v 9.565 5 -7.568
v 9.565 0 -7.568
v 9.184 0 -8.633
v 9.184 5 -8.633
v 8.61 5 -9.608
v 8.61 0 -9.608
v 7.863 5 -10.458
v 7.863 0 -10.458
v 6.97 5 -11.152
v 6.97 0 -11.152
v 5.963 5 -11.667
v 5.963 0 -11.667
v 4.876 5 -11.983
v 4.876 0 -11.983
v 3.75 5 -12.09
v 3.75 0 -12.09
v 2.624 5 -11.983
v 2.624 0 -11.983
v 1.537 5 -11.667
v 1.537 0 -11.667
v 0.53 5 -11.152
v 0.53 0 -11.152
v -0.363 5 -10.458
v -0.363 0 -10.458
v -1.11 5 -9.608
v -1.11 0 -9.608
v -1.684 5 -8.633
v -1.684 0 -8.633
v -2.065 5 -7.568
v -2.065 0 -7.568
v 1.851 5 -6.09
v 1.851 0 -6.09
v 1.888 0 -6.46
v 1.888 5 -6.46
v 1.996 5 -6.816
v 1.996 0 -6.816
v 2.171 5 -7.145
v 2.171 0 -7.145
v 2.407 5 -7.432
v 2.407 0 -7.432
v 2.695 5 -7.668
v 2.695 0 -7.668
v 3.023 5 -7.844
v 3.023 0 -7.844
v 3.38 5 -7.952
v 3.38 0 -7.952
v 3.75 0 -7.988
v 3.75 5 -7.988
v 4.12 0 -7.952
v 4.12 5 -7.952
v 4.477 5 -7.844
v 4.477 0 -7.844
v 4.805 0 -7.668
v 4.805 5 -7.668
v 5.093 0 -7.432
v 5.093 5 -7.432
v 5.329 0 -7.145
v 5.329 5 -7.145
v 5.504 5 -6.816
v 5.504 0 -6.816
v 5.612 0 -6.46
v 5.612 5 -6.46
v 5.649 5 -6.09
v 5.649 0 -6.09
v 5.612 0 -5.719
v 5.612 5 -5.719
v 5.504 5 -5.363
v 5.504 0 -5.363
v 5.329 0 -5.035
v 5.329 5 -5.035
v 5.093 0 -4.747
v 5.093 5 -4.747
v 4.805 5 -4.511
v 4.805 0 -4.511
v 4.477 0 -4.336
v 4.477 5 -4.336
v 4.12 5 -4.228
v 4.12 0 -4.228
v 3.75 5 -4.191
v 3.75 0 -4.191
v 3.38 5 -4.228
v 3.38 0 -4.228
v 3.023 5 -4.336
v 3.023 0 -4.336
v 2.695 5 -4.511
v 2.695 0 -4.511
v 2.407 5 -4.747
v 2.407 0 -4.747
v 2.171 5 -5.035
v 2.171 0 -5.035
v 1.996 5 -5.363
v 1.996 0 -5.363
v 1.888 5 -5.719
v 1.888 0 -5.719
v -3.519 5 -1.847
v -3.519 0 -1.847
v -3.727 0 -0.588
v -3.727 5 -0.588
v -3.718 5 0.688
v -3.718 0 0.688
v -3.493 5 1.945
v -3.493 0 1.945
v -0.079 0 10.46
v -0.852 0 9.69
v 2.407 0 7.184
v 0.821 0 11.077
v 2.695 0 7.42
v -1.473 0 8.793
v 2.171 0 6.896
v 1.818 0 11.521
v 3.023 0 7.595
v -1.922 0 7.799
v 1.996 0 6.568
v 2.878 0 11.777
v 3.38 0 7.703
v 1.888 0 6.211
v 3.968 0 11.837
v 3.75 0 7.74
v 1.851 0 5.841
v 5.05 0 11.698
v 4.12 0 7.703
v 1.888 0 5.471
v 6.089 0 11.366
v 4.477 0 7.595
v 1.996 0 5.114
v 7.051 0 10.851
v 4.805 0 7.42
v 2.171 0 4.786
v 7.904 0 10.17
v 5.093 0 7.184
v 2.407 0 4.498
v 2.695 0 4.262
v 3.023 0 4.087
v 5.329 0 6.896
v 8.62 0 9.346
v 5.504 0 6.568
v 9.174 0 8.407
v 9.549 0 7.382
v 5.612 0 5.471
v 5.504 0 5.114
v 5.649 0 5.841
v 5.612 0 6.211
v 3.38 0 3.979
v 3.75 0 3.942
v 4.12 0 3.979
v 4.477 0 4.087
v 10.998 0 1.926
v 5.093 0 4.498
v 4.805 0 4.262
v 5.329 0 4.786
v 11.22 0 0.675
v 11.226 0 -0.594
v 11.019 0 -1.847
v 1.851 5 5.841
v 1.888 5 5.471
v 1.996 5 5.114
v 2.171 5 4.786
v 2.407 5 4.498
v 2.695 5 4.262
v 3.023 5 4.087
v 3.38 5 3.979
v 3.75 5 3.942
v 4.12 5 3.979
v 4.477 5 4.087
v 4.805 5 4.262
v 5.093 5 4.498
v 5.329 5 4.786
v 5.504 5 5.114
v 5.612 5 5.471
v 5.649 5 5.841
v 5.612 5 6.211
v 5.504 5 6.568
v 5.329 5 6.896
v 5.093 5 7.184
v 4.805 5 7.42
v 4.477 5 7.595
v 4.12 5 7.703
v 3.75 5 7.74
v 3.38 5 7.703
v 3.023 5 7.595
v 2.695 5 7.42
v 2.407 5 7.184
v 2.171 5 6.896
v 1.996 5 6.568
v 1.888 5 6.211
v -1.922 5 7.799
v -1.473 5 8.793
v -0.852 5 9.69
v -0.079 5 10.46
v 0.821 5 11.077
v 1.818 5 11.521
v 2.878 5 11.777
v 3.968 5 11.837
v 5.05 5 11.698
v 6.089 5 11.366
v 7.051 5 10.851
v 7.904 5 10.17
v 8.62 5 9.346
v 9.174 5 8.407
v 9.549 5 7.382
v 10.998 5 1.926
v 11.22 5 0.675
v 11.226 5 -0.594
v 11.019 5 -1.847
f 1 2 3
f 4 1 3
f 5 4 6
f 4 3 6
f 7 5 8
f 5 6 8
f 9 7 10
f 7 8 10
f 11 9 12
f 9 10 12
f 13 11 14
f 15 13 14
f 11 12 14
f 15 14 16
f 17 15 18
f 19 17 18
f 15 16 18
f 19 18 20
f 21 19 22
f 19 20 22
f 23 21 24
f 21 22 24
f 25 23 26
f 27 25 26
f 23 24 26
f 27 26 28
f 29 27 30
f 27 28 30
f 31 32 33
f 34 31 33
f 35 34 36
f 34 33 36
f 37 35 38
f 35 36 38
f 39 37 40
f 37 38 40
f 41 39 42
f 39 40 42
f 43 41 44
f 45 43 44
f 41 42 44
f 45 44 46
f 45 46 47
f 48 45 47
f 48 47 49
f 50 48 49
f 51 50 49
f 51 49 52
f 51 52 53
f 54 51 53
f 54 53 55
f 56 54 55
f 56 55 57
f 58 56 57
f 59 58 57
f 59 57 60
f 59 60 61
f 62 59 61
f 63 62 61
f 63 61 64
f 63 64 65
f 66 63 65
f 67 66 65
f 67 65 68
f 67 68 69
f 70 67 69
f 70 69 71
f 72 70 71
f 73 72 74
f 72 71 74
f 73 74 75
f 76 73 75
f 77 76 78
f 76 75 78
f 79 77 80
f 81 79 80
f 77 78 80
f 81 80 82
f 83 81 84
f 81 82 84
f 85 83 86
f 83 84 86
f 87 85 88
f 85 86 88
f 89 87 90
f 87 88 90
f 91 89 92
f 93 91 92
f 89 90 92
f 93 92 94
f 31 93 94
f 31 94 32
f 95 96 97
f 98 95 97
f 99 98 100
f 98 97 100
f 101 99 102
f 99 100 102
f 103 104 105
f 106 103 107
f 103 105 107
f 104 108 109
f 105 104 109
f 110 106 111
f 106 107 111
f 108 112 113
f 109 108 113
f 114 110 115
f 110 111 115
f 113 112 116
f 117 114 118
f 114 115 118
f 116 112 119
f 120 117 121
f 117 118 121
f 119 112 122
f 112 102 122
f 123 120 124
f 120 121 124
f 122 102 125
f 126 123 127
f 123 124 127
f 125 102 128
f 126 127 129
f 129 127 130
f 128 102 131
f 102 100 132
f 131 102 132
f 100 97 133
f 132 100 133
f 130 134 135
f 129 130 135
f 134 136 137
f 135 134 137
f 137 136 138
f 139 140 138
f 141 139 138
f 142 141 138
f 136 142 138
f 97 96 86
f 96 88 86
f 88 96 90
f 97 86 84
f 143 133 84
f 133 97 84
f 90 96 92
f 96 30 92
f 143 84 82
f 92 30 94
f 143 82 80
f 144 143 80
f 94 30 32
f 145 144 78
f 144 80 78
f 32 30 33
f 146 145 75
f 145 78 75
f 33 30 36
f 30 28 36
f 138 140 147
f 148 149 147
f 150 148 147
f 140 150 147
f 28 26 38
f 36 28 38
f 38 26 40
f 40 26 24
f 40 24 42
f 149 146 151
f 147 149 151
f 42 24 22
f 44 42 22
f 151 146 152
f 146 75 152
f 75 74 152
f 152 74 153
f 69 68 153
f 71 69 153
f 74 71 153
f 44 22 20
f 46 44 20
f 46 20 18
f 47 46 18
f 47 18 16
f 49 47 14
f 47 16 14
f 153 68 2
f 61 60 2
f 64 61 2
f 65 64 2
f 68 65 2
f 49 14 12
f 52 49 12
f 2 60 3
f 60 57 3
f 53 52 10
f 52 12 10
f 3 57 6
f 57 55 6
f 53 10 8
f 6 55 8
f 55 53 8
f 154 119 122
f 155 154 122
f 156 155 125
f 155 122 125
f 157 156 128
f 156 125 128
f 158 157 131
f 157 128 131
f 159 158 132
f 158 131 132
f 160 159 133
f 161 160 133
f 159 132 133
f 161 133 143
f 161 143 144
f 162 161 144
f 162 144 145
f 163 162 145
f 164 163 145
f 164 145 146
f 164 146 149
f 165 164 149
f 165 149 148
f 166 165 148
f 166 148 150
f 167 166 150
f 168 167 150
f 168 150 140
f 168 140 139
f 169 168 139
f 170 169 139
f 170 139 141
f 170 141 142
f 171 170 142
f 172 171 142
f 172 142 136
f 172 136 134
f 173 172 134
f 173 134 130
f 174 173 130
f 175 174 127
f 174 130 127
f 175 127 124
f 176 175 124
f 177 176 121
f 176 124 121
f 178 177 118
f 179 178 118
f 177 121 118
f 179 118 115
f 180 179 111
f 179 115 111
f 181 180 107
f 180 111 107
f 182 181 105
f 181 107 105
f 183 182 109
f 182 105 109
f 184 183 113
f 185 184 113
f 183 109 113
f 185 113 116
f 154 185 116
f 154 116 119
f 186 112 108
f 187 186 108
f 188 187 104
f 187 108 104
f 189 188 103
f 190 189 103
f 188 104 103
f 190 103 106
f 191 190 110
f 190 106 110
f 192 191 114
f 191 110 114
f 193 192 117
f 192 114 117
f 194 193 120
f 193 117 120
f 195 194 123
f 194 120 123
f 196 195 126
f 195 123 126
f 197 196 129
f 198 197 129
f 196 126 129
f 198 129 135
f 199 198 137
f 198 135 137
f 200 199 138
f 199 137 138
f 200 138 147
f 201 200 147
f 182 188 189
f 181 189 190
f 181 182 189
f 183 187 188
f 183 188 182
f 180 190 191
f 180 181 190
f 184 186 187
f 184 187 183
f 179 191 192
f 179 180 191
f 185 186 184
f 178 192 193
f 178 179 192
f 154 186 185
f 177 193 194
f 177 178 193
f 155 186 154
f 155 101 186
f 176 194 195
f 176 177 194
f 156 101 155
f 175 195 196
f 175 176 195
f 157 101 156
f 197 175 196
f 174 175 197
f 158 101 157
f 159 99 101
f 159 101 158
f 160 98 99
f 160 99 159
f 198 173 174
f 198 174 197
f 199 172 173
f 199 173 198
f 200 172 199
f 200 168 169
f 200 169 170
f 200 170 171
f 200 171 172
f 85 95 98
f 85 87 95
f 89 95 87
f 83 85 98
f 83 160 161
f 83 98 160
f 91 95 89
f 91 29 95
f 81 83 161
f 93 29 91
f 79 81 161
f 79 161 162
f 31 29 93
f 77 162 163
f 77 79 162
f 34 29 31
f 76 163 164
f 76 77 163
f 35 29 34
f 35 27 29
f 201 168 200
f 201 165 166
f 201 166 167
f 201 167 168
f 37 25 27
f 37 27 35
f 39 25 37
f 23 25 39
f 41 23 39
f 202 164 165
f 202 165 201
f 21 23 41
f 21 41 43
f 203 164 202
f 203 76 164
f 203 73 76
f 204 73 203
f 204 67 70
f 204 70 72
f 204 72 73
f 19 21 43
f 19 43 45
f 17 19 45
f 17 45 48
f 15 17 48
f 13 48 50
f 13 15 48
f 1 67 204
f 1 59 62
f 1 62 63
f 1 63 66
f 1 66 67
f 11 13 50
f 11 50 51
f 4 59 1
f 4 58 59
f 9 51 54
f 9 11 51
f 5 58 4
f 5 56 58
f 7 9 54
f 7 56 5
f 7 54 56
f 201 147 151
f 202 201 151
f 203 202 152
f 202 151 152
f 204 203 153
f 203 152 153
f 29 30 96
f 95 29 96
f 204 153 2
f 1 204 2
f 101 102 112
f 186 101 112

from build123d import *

# Parameters (mm, degrees)
BOSS_EXTRUDE2_DEPTH   = 5
F_6_CLEARANCE_HOLE1_D = 3.7973


with BuildPart() as part:
    # Sketch2 → Boss-Extrude2 (new body)
    with BuildSketch(Plane(origin=(0, 0, 0), x_dir=(1, 0, 0), z_dir=(0, 1, 0))):
        with BuildLine():
            ThreePointArc((-1.921673483, -7.798539123), (3.967844549, -11.837003018), (9.548776015, -7.381801872))
            Line((9.548776015, -7.381801872), (10.998470019, -1.926053578))
            ThreePointArc((10.998470019, -1.926053578), (11.24988985, -0.04064778), (11.018921171, 1.84737246))
            Line((11.018921171, 1.84737246), (9.565136937, 7.567628243))
            ThreePointArc((9.565136937, 7.567628243), (3.75, 12.089730275), (-2.065136937, 7.567628243))
            Line((-2.065136937, 7.567628243), (-3.518921171, 1.84737246))
            ThreePointArc((-3.518921171, 1.84737246), (-3.749830525, -0.050419155), (-3.493426606, -1.944934706))
            Line((-3.493426606, -1.944934706), (-1.921673483, -7.798539123))
        make_face()
    extrude(amount=BOSS_EXTRUDE2_DEPTH)

    # #6 Clearance Hole1 (through all)
    with Locations(Plane(origin=(0, 5, 0), x_dir=(1, 0, 0), z_dir=(0, 1, 0))):
        with Locations((3.75, 6.089730275), (3.75, -5.840959009)):
            Hole(F_6_CLEARANCE_HOLE1_D / 2)


solid = part.part
